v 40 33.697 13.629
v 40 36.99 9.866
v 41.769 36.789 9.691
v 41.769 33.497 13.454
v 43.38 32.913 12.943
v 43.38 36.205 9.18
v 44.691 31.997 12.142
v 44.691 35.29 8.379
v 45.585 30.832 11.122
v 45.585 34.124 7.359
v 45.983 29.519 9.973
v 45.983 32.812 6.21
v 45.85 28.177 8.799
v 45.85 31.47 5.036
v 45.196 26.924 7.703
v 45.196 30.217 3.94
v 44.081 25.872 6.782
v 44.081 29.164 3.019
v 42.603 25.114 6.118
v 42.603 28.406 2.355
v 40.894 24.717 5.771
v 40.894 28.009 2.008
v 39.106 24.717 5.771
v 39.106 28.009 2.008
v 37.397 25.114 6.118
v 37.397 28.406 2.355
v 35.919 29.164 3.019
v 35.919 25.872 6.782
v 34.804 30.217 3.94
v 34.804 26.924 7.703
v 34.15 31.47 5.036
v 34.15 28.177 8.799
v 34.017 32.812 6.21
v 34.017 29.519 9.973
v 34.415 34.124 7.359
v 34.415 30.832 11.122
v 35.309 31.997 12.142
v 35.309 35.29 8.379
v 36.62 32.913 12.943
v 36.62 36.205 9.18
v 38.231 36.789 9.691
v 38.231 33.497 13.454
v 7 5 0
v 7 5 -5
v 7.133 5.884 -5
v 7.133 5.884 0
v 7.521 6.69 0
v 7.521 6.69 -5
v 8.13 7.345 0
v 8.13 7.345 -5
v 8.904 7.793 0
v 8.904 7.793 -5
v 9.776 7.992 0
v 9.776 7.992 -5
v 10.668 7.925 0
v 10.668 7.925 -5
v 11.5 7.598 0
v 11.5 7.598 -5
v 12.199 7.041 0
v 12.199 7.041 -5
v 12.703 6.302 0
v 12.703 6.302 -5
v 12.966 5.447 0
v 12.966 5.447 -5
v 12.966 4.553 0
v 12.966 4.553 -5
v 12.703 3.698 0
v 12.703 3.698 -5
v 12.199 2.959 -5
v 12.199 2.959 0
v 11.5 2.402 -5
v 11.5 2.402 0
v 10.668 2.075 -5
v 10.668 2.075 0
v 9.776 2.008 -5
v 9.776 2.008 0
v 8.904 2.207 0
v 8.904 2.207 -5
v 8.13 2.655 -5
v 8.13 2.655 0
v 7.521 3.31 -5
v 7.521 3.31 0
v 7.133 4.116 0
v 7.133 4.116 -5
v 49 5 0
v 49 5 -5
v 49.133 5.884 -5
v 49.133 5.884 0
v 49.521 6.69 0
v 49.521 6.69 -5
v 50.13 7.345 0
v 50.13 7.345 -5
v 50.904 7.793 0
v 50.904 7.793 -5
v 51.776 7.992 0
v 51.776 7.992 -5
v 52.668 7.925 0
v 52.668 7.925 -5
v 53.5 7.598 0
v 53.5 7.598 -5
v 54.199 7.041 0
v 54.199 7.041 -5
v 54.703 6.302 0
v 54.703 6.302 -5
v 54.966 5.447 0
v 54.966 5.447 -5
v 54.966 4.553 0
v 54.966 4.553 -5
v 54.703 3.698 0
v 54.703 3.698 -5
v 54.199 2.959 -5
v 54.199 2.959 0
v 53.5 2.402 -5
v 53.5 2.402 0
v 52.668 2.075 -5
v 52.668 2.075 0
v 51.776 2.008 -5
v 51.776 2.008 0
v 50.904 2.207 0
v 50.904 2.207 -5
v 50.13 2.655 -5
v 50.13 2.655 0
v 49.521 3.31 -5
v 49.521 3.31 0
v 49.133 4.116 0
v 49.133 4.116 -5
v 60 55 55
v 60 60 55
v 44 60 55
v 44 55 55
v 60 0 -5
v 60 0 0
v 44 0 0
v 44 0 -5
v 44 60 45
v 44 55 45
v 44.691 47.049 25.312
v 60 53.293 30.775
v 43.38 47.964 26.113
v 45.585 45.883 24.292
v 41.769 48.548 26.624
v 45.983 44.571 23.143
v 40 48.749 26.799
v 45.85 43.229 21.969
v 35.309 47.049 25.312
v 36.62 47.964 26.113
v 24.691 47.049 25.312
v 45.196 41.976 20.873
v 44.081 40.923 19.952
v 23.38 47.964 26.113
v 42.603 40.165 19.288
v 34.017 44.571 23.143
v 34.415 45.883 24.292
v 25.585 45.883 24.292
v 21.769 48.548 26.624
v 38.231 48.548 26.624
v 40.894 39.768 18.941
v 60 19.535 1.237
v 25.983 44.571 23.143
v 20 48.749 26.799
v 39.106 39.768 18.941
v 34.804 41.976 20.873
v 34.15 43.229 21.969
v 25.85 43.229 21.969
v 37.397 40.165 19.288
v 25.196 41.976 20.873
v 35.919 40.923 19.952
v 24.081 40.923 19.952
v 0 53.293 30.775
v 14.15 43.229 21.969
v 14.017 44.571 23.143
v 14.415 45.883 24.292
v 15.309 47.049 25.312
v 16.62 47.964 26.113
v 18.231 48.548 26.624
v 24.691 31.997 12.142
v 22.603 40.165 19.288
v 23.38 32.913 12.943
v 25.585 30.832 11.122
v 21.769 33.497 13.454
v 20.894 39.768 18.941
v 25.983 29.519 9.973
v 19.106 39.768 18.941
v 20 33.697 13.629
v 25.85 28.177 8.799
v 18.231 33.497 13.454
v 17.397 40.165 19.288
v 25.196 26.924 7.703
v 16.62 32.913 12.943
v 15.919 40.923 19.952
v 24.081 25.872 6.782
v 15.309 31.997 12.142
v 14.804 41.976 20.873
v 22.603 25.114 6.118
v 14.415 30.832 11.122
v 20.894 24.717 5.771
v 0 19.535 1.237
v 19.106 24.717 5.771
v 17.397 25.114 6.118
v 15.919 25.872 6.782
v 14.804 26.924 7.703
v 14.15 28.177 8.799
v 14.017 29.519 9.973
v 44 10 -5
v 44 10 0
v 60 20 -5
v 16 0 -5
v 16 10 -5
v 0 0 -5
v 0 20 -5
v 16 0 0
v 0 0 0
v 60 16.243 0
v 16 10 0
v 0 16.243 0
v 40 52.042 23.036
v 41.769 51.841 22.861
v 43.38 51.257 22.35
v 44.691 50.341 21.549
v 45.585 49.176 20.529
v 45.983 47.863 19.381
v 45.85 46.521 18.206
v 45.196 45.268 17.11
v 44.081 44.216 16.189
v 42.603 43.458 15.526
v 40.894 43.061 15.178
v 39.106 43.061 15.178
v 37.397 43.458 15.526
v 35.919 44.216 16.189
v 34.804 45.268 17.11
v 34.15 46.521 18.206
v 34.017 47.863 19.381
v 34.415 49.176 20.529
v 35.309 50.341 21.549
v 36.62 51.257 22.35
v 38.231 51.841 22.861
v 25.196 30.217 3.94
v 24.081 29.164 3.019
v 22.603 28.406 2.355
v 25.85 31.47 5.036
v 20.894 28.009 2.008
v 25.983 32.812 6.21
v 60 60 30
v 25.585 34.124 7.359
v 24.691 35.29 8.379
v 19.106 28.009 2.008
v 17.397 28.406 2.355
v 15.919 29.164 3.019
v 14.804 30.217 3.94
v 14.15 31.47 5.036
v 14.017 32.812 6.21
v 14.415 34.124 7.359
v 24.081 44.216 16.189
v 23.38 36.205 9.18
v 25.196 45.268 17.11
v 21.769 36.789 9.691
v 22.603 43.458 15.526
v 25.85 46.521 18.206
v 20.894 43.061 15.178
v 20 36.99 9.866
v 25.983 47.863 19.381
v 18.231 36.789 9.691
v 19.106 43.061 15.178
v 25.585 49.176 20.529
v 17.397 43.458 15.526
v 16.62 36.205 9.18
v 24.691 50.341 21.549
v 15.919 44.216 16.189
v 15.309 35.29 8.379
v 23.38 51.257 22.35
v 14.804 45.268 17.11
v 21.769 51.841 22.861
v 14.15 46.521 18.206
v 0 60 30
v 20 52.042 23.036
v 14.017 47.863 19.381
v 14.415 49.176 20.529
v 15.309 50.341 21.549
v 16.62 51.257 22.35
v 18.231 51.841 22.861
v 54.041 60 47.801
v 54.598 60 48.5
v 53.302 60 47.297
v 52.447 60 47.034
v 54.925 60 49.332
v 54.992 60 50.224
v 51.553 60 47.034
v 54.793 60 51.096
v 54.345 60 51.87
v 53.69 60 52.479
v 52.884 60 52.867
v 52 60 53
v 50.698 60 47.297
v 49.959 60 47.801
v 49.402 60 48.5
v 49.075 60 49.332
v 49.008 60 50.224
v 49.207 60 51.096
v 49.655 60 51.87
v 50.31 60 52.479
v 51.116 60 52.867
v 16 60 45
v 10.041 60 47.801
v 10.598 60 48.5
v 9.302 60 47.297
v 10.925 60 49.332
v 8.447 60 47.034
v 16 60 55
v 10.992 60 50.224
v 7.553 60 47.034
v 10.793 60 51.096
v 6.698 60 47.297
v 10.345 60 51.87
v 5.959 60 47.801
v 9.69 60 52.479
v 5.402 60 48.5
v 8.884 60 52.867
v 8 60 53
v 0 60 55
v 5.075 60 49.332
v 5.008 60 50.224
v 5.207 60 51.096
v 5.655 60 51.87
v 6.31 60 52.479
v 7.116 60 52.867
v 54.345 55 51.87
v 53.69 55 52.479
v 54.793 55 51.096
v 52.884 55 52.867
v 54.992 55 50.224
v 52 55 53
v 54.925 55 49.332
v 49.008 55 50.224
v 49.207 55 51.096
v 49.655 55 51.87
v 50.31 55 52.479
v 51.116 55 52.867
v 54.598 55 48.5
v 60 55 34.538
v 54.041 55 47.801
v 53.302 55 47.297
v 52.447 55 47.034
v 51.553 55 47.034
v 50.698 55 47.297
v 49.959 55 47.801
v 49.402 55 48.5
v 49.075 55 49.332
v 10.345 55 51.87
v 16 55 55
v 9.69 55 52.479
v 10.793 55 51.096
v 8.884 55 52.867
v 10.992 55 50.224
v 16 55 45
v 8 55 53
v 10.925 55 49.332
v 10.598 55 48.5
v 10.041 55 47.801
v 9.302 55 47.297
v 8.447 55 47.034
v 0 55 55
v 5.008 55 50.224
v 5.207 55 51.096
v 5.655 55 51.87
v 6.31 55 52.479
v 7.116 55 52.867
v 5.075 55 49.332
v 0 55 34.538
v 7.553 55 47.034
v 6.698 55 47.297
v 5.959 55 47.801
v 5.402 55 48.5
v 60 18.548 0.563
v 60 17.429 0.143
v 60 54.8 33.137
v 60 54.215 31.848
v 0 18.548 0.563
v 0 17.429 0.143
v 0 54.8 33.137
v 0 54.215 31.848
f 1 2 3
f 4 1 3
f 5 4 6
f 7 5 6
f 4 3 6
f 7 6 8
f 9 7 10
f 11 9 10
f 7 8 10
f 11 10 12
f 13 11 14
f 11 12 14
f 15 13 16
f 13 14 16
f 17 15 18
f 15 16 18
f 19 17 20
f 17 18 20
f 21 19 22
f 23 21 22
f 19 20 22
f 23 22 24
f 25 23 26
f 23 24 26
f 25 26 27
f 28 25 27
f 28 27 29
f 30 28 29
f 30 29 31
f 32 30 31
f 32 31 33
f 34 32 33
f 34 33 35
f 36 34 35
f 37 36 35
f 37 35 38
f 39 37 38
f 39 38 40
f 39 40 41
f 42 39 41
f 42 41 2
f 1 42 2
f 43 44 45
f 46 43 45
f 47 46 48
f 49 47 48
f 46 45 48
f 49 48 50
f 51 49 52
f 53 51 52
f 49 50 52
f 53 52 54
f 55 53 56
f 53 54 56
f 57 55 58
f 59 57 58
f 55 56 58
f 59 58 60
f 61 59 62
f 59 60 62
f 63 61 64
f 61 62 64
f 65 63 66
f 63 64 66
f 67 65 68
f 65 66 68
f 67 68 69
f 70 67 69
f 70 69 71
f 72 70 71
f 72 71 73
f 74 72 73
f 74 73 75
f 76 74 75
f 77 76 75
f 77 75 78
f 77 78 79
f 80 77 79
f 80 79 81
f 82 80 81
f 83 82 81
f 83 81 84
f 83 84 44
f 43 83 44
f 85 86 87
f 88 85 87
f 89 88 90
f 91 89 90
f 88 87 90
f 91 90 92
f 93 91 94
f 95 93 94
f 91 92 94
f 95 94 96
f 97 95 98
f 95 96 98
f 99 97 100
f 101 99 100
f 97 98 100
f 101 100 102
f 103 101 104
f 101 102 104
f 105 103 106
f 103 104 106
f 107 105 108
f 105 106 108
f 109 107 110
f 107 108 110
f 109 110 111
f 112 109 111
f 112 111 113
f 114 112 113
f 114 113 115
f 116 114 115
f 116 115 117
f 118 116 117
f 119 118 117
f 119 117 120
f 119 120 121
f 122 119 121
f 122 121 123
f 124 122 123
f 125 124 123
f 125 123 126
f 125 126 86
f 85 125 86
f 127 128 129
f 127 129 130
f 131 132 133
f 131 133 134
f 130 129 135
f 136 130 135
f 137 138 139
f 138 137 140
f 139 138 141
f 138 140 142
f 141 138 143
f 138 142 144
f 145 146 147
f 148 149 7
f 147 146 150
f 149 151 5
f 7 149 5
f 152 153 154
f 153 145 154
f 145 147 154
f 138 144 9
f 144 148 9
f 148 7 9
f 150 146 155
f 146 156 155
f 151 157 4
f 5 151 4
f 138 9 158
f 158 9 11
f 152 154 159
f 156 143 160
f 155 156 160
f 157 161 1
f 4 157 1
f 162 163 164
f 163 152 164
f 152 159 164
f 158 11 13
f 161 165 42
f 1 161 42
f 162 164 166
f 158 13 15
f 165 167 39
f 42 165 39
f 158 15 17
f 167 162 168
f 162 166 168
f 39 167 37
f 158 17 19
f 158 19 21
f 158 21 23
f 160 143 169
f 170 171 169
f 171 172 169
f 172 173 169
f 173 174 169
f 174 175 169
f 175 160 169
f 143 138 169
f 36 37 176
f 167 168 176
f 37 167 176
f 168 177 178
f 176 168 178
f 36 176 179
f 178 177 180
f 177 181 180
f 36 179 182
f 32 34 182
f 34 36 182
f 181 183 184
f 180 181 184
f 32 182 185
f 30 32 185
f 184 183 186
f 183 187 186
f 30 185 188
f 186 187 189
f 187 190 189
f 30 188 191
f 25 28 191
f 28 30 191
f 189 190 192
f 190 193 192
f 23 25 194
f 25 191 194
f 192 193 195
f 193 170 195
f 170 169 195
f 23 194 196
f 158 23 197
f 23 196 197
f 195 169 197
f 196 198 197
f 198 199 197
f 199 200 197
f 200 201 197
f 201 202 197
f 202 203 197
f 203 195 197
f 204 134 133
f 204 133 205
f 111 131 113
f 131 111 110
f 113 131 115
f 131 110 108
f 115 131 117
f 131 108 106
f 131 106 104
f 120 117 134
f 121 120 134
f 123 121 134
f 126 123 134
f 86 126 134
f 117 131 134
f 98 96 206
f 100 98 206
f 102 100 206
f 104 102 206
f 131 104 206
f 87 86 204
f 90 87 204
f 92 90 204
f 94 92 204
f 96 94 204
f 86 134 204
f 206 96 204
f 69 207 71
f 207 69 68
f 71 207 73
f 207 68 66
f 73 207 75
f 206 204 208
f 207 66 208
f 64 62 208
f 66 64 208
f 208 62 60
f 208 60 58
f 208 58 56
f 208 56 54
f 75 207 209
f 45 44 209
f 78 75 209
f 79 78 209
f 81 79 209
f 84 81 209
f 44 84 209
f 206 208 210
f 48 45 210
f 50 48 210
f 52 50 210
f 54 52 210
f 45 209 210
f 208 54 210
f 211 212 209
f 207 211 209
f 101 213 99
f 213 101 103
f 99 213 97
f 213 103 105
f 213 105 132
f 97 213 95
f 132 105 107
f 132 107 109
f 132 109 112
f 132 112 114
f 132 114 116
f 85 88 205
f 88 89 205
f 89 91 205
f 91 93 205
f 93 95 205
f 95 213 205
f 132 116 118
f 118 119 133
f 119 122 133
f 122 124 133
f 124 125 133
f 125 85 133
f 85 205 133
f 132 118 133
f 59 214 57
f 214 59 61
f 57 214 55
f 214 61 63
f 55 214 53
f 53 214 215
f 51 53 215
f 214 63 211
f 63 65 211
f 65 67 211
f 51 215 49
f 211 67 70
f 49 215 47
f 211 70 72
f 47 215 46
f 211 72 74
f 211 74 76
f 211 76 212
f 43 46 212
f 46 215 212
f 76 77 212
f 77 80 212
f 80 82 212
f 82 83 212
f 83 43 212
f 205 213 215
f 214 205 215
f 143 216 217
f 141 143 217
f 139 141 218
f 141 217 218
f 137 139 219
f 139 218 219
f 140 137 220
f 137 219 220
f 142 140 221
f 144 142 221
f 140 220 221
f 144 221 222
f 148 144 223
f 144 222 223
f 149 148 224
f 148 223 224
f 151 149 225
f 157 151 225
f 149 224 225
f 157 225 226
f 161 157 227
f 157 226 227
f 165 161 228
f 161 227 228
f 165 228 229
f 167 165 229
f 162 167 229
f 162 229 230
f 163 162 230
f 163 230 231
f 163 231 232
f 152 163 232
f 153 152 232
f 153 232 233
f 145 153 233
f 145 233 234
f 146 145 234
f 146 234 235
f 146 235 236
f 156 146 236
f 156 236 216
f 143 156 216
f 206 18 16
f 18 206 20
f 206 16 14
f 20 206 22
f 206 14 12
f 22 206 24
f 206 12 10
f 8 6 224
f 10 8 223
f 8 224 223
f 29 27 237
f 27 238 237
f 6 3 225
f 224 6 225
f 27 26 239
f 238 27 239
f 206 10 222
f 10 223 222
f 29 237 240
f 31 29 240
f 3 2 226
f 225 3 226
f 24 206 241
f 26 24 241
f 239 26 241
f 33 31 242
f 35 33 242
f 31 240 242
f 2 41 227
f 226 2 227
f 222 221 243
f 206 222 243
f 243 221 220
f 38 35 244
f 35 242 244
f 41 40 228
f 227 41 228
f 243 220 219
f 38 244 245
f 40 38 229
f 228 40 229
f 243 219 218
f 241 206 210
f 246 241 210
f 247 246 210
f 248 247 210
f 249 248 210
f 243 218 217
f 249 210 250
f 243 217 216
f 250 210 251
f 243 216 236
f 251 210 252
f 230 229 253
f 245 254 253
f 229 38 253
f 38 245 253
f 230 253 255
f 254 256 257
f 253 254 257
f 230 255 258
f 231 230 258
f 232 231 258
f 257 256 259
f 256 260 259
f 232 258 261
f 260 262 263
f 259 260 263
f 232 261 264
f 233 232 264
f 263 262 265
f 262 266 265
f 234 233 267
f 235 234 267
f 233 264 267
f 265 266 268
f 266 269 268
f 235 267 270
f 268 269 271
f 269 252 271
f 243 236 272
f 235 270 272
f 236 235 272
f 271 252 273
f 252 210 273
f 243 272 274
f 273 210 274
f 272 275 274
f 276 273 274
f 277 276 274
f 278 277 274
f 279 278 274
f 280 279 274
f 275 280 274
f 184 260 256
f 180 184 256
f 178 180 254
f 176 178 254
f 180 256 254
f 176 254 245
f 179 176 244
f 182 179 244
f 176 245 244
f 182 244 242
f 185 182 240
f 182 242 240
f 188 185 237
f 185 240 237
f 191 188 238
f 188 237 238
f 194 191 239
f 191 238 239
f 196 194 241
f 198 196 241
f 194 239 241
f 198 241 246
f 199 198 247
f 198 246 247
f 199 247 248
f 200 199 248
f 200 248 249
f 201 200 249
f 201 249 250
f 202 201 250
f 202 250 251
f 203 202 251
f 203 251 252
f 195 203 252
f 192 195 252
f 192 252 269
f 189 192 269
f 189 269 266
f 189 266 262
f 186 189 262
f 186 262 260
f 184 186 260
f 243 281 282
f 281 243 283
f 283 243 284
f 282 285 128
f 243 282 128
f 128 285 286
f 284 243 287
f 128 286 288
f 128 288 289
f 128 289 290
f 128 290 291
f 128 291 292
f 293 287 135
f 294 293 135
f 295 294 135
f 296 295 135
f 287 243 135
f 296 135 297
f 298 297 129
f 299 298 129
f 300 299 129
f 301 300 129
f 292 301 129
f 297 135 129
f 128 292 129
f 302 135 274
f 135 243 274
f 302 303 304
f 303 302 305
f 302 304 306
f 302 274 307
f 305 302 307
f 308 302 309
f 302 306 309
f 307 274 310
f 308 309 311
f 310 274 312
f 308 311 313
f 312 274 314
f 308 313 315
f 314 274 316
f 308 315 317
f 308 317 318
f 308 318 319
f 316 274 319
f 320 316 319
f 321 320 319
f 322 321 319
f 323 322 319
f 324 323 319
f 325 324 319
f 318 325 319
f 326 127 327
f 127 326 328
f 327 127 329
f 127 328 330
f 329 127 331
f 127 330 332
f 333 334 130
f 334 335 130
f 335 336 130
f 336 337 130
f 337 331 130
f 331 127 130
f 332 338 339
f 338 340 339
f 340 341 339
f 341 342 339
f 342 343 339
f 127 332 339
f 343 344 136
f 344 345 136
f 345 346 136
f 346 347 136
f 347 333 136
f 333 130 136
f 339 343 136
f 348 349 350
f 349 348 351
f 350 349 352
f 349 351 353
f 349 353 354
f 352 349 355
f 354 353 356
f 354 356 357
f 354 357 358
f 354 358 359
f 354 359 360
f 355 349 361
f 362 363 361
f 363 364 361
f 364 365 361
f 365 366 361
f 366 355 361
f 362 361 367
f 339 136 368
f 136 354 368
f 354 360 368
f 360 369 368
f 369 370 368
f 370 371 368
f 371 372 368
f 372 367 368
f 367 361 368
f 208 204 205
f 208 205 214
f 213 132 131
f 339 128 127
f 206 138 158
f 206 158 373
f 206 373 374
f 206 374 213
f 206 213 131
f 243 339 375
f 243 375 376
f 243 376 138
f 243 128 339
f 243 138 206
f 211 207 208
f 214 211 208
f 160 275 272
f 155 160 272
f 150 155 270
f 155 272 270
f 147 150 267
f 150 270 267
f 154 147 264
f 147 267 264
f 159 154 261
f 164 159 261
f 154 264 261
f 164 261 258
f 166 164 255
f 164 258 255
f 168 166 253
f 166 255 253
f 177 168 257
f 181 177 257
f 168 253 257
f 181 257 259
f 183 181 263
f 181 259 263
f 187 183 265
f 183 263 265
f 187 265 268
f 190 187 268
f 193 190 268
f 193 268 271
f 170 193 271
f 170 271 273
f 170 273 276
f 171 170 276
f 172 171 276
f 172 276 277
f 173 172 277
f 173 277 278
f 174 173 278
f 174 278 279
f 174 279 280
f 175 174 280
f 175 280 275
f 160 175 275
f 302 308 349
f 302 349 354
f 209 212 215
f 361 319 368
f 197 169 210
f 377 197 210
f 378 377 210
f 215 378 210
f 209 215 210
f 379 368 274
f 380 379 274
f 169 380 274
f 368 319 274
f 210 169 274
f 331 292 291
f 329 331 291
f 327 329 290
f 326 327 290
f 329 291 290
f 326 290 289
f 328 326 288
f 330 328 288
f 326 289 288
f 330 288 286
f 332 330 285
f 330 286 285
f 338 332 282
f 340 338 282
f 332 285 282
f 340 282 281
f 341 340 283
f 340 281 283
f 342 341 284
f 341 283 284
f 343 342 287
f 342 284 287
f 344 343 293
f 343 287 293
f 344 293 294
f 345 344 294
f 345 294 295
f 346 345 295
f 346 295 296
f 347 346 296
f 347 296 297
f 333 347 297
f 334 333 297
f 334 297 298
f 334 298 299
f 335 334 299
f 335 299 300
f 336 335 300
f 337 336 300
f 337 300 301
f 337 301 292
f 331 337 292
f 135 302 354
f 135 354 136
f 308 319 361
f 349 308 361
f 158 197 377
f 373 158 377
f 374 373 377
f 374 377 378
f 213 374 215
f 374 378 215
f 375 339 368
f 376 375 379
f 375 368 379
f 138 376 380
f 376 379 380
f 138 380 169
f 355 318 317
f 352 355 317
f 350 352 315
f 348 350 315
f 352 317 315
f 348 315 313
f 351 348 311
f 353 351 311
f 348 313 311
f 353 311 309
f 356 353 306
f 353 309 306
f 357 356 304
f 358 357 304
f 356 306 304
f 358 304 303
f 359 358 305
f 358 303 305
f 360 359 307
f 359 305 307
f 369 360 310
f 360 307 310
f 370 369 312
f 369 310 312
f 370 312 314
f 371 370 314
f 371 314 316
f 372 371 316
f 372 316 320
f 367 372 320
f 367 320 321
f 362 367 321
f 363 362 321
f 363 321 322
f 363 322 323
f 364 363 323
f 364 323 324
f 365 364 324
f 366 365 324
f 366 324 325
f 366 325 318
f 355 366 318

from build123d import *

# Parameters (mm, degrees)
BOSS_EXTRUDE1_DEPTH = 60
CUT_EXTRUDE1_REACH  = 104.837
SKETCH2_R           = 6
CUT_EXTRUDE2_REACH  = 105.923
SKETCH3_R           = 3
SKETCH3_W           = 28
SKETCH3_H           = 10
SKETCH4_R           = 3
SKETCH4_W           = 28
SKETCH4_H           = 10
CUT_EXTRUDE3_DEPTH  = 60


with BuildPart() as part:
    # Sketch1 → Boss-Extrude1 (new body)
    with BuildSketch(Plane(origin=(0, 0, 0), x_dir=(0, 0, -1), z_dir=(1, 0, 0))):
        with BuildLine():
            Line((-55, 60), (-55, 55))
            Line((-55, 55), (-34.537682266, 55))
            ThreePointArc((-34.537682266, 55), (-32.471600854, 54.55316457), (-30.774798792, 53.292523039))
            Line((-30.774798792, 53.292523039), (-1.237116526, 19.535171878))
            ThreePointArc((-1.237116526, 19.535171878), (-0.31948628, 18.001282205), (0, 16.242648839))
            Line((0, 16.242648839), (0, 0))
            Line((0, 0), (5, 0))
            Line((5, 0), (5, 20))
            Line((5, 20), (-30, 60))
            Line((-30, 60), (-55, 60))
        make_face()
    extrude(amount=BOSS_EXTRUDE1_DEPTH)

    # Sketch2 → Cut-Extrude1 (cut, up to next)
    with BuildSketch(Plane(origin=(0, 11.150442478, -12.743362832), x_dir=(-1, 0, 0), z_dir=(0, 0.6585046078685178, -0.752576694706878)), mode=Mode.PRIVATE) as cut_extrude1_sk1:
        with Locations(Location((-40, 48.334739918, 0), (0, 0, 90))):
            Circle(SKETCH2_R)
    cut_extrude1_tool1 = extrude(cut_extrude1_sk1.sketch, amount=-CUT_EXTRUDE1_REACH, mode=Mode.PRIVATE) & part.part
    # Sketch2 → Cut-Extrude1 (cut, up to next)
    with BuildSketch(Plane(origin=(0, 11.150442478, -12.743362832), x_dir=(-1, 0, 0), z_dir=(0, 0.6585046078685178, -0.752576694706878)), mode=Mode.PRIVATE) as cut_extrude1_sk2:
        with Locations(Location((-40, 28.334739918, 0), (0, 0, 90))):
            Circle(SKETCH2_R)
    cut_extrude1_tool2 = extrude(cut_extrude1_sk2.sketch, amount=-CUT_EXTRUDE1_REACH, mode=Mode.PRIVATE) & part.part
    # Sketch2 → Cut-Extrude1 (cut, up to next)
    with BuildSketch(Plane(origin=(0, 11.150442478, -12.743362832), x_dir=(-1, 0, 0), z_dir=(0, 0.6585046078685178, -0.752576694706878)), mode=Mode.PRIVATE) as cut_extrude1_sk3:
        with Locations(Location((-20, 48.334739918, 0), (0, 0, 90))):
            Circle(SKETCH2_R)
    cut_extrude1_tool3 = extrude(cut_extrude1_sk3.sketch, amount=-CUT_EXTRUDE1_REACH, mode=Mode.PRIVATE) & part.part
    # Sketch2 → Cut-Extrude1 (cut, up to next)
    with BuildSketch(Plane(origin=(0, 11.150442478, -12.743362832), x_dir=(-1, 0, 0), z_dir=(0, 0.6585046078685178, -0.752576694706878)), mode=Mode.PRIVATE) as cut_extrude1_sk4:
        with Locations(Location((-20, 28.334739918, 0), (0, 0, 90))):
            Circle(SKETCH2_R)
    cut_extrude1_tool4 = extrude(cut_extrude1_sk4.sketch, amount=-CUT_EXTRUDE1_REACH, mode=Mode.PRIVATE) & part.part
    add(cut_extrude1_tool1.solids().sort_by_distance((40, 47.526041, 19.085286))[0], mode=Mode.SUBTRACT)
    add(cut_extrude1_tool2.solids().sort_by_distance((40, 32.474507, 5.915194))[0], mode=Mode.SUBTRACT)
    add(cut_extrude1_tool3.solids().sort_by_distance((20, 47.526041, 19.085286))[0], mode=Mode.SUBTRACT)
    add(cut_extrude1_tool4.solids().sort_by_distance((20, 32.474507, 5.915194))[0], mode=Mode.SUBTRACT)

    # Sketch3 → Cut-Extrude2 (cut, up to next)
    with BuildSketch(Plane(origin=(0, 0, -5), x_dir=(-1, 0, 0), z_dir=(0, 0, -1)), mode=Mode.PRIVATE) as cut_extrude2_sk1:
        with Locations((-52, 5)):
            Circle(SKETCH3_R)
    cut_extrude2_tool1 = extrude(cut_extrude2_sk1.sketch, amount=-CUT_EXTRUDE2_REACH, mode=Mode.PRIVATE) & part.part
    # Sketch3 → Cut-Extrude2 (cut, up to next)
    with BuildSketch(Plane(origin=(0, 0, -5), x_dir=(-1, 0, 0), z_dir=(0, 0, -1)), mode=Mode.PRIVATE) as cut_extrude2_sk2:
        with Locations((-10, 5)):
            Circle(SKETCH3_R)
    cut_extrude2_tool2 = extrude(cut_extrude2_sk2.sketch, amount=-CUT_EXTRUDE2_REACH, mode=Mode.PRIVATE) & part.part
    # Sketch3 → Cut-Extrude2 (cut, up to next)
    with BuildSketch(Plane(origin=(0, 0, -5), x_dir=(-1, 0, 0), z_dir=(0, 0, -1)), mode=Mode.PRIVATE) as cut_extrude2_sk3:
        with Locations((-30, 5)):
            Rectangle(SKETCH3_W, SKETCH3_H)
    cut_extrude2_tool3 = extrude(cut_extrude2_sk3.sketch, amount=-CUT_EXTRUDE2_REACH, mode=Mode.PRIVATE) & part.part
    add(cut_extrude2_tool1.solids().sort_by_distance((52, 5, -5))[0], mode=Mode.SUBTRACT)
    add(cut_extrude2_tool2.solids().sort_by_distance((10, 5, -5))[0], mode=Mode.SUBTRACT)
    add(cut_extrude2_tool3.solids().sort_by_distance((30, 5, -5))[0], mode=Mode.SUBTRACT)

    # Sketch4 → Cut-Extrude3 (cut)
    with BuildSketch(Plane(origin=(0, 60, 0), x_dir=(1, 0, 0), z_dir=(0, 1, 0))):
        with Locations(Location((8, -50, 0), (0, 0, 270))):
            Circle(SKETCH4_R)
        with Locations(Location((52, -50, 0), (0, 0, 270))):
            Circle(SKETCH4_R)
        with Locations((30, -50)):
            Rectangle(SKETCH4_W, SKETCH4_H)
    extrude(amount=-CUT_EXTRUDE3_DEPTH, mode=Mode.SUBTRACT)


solid = part.part
